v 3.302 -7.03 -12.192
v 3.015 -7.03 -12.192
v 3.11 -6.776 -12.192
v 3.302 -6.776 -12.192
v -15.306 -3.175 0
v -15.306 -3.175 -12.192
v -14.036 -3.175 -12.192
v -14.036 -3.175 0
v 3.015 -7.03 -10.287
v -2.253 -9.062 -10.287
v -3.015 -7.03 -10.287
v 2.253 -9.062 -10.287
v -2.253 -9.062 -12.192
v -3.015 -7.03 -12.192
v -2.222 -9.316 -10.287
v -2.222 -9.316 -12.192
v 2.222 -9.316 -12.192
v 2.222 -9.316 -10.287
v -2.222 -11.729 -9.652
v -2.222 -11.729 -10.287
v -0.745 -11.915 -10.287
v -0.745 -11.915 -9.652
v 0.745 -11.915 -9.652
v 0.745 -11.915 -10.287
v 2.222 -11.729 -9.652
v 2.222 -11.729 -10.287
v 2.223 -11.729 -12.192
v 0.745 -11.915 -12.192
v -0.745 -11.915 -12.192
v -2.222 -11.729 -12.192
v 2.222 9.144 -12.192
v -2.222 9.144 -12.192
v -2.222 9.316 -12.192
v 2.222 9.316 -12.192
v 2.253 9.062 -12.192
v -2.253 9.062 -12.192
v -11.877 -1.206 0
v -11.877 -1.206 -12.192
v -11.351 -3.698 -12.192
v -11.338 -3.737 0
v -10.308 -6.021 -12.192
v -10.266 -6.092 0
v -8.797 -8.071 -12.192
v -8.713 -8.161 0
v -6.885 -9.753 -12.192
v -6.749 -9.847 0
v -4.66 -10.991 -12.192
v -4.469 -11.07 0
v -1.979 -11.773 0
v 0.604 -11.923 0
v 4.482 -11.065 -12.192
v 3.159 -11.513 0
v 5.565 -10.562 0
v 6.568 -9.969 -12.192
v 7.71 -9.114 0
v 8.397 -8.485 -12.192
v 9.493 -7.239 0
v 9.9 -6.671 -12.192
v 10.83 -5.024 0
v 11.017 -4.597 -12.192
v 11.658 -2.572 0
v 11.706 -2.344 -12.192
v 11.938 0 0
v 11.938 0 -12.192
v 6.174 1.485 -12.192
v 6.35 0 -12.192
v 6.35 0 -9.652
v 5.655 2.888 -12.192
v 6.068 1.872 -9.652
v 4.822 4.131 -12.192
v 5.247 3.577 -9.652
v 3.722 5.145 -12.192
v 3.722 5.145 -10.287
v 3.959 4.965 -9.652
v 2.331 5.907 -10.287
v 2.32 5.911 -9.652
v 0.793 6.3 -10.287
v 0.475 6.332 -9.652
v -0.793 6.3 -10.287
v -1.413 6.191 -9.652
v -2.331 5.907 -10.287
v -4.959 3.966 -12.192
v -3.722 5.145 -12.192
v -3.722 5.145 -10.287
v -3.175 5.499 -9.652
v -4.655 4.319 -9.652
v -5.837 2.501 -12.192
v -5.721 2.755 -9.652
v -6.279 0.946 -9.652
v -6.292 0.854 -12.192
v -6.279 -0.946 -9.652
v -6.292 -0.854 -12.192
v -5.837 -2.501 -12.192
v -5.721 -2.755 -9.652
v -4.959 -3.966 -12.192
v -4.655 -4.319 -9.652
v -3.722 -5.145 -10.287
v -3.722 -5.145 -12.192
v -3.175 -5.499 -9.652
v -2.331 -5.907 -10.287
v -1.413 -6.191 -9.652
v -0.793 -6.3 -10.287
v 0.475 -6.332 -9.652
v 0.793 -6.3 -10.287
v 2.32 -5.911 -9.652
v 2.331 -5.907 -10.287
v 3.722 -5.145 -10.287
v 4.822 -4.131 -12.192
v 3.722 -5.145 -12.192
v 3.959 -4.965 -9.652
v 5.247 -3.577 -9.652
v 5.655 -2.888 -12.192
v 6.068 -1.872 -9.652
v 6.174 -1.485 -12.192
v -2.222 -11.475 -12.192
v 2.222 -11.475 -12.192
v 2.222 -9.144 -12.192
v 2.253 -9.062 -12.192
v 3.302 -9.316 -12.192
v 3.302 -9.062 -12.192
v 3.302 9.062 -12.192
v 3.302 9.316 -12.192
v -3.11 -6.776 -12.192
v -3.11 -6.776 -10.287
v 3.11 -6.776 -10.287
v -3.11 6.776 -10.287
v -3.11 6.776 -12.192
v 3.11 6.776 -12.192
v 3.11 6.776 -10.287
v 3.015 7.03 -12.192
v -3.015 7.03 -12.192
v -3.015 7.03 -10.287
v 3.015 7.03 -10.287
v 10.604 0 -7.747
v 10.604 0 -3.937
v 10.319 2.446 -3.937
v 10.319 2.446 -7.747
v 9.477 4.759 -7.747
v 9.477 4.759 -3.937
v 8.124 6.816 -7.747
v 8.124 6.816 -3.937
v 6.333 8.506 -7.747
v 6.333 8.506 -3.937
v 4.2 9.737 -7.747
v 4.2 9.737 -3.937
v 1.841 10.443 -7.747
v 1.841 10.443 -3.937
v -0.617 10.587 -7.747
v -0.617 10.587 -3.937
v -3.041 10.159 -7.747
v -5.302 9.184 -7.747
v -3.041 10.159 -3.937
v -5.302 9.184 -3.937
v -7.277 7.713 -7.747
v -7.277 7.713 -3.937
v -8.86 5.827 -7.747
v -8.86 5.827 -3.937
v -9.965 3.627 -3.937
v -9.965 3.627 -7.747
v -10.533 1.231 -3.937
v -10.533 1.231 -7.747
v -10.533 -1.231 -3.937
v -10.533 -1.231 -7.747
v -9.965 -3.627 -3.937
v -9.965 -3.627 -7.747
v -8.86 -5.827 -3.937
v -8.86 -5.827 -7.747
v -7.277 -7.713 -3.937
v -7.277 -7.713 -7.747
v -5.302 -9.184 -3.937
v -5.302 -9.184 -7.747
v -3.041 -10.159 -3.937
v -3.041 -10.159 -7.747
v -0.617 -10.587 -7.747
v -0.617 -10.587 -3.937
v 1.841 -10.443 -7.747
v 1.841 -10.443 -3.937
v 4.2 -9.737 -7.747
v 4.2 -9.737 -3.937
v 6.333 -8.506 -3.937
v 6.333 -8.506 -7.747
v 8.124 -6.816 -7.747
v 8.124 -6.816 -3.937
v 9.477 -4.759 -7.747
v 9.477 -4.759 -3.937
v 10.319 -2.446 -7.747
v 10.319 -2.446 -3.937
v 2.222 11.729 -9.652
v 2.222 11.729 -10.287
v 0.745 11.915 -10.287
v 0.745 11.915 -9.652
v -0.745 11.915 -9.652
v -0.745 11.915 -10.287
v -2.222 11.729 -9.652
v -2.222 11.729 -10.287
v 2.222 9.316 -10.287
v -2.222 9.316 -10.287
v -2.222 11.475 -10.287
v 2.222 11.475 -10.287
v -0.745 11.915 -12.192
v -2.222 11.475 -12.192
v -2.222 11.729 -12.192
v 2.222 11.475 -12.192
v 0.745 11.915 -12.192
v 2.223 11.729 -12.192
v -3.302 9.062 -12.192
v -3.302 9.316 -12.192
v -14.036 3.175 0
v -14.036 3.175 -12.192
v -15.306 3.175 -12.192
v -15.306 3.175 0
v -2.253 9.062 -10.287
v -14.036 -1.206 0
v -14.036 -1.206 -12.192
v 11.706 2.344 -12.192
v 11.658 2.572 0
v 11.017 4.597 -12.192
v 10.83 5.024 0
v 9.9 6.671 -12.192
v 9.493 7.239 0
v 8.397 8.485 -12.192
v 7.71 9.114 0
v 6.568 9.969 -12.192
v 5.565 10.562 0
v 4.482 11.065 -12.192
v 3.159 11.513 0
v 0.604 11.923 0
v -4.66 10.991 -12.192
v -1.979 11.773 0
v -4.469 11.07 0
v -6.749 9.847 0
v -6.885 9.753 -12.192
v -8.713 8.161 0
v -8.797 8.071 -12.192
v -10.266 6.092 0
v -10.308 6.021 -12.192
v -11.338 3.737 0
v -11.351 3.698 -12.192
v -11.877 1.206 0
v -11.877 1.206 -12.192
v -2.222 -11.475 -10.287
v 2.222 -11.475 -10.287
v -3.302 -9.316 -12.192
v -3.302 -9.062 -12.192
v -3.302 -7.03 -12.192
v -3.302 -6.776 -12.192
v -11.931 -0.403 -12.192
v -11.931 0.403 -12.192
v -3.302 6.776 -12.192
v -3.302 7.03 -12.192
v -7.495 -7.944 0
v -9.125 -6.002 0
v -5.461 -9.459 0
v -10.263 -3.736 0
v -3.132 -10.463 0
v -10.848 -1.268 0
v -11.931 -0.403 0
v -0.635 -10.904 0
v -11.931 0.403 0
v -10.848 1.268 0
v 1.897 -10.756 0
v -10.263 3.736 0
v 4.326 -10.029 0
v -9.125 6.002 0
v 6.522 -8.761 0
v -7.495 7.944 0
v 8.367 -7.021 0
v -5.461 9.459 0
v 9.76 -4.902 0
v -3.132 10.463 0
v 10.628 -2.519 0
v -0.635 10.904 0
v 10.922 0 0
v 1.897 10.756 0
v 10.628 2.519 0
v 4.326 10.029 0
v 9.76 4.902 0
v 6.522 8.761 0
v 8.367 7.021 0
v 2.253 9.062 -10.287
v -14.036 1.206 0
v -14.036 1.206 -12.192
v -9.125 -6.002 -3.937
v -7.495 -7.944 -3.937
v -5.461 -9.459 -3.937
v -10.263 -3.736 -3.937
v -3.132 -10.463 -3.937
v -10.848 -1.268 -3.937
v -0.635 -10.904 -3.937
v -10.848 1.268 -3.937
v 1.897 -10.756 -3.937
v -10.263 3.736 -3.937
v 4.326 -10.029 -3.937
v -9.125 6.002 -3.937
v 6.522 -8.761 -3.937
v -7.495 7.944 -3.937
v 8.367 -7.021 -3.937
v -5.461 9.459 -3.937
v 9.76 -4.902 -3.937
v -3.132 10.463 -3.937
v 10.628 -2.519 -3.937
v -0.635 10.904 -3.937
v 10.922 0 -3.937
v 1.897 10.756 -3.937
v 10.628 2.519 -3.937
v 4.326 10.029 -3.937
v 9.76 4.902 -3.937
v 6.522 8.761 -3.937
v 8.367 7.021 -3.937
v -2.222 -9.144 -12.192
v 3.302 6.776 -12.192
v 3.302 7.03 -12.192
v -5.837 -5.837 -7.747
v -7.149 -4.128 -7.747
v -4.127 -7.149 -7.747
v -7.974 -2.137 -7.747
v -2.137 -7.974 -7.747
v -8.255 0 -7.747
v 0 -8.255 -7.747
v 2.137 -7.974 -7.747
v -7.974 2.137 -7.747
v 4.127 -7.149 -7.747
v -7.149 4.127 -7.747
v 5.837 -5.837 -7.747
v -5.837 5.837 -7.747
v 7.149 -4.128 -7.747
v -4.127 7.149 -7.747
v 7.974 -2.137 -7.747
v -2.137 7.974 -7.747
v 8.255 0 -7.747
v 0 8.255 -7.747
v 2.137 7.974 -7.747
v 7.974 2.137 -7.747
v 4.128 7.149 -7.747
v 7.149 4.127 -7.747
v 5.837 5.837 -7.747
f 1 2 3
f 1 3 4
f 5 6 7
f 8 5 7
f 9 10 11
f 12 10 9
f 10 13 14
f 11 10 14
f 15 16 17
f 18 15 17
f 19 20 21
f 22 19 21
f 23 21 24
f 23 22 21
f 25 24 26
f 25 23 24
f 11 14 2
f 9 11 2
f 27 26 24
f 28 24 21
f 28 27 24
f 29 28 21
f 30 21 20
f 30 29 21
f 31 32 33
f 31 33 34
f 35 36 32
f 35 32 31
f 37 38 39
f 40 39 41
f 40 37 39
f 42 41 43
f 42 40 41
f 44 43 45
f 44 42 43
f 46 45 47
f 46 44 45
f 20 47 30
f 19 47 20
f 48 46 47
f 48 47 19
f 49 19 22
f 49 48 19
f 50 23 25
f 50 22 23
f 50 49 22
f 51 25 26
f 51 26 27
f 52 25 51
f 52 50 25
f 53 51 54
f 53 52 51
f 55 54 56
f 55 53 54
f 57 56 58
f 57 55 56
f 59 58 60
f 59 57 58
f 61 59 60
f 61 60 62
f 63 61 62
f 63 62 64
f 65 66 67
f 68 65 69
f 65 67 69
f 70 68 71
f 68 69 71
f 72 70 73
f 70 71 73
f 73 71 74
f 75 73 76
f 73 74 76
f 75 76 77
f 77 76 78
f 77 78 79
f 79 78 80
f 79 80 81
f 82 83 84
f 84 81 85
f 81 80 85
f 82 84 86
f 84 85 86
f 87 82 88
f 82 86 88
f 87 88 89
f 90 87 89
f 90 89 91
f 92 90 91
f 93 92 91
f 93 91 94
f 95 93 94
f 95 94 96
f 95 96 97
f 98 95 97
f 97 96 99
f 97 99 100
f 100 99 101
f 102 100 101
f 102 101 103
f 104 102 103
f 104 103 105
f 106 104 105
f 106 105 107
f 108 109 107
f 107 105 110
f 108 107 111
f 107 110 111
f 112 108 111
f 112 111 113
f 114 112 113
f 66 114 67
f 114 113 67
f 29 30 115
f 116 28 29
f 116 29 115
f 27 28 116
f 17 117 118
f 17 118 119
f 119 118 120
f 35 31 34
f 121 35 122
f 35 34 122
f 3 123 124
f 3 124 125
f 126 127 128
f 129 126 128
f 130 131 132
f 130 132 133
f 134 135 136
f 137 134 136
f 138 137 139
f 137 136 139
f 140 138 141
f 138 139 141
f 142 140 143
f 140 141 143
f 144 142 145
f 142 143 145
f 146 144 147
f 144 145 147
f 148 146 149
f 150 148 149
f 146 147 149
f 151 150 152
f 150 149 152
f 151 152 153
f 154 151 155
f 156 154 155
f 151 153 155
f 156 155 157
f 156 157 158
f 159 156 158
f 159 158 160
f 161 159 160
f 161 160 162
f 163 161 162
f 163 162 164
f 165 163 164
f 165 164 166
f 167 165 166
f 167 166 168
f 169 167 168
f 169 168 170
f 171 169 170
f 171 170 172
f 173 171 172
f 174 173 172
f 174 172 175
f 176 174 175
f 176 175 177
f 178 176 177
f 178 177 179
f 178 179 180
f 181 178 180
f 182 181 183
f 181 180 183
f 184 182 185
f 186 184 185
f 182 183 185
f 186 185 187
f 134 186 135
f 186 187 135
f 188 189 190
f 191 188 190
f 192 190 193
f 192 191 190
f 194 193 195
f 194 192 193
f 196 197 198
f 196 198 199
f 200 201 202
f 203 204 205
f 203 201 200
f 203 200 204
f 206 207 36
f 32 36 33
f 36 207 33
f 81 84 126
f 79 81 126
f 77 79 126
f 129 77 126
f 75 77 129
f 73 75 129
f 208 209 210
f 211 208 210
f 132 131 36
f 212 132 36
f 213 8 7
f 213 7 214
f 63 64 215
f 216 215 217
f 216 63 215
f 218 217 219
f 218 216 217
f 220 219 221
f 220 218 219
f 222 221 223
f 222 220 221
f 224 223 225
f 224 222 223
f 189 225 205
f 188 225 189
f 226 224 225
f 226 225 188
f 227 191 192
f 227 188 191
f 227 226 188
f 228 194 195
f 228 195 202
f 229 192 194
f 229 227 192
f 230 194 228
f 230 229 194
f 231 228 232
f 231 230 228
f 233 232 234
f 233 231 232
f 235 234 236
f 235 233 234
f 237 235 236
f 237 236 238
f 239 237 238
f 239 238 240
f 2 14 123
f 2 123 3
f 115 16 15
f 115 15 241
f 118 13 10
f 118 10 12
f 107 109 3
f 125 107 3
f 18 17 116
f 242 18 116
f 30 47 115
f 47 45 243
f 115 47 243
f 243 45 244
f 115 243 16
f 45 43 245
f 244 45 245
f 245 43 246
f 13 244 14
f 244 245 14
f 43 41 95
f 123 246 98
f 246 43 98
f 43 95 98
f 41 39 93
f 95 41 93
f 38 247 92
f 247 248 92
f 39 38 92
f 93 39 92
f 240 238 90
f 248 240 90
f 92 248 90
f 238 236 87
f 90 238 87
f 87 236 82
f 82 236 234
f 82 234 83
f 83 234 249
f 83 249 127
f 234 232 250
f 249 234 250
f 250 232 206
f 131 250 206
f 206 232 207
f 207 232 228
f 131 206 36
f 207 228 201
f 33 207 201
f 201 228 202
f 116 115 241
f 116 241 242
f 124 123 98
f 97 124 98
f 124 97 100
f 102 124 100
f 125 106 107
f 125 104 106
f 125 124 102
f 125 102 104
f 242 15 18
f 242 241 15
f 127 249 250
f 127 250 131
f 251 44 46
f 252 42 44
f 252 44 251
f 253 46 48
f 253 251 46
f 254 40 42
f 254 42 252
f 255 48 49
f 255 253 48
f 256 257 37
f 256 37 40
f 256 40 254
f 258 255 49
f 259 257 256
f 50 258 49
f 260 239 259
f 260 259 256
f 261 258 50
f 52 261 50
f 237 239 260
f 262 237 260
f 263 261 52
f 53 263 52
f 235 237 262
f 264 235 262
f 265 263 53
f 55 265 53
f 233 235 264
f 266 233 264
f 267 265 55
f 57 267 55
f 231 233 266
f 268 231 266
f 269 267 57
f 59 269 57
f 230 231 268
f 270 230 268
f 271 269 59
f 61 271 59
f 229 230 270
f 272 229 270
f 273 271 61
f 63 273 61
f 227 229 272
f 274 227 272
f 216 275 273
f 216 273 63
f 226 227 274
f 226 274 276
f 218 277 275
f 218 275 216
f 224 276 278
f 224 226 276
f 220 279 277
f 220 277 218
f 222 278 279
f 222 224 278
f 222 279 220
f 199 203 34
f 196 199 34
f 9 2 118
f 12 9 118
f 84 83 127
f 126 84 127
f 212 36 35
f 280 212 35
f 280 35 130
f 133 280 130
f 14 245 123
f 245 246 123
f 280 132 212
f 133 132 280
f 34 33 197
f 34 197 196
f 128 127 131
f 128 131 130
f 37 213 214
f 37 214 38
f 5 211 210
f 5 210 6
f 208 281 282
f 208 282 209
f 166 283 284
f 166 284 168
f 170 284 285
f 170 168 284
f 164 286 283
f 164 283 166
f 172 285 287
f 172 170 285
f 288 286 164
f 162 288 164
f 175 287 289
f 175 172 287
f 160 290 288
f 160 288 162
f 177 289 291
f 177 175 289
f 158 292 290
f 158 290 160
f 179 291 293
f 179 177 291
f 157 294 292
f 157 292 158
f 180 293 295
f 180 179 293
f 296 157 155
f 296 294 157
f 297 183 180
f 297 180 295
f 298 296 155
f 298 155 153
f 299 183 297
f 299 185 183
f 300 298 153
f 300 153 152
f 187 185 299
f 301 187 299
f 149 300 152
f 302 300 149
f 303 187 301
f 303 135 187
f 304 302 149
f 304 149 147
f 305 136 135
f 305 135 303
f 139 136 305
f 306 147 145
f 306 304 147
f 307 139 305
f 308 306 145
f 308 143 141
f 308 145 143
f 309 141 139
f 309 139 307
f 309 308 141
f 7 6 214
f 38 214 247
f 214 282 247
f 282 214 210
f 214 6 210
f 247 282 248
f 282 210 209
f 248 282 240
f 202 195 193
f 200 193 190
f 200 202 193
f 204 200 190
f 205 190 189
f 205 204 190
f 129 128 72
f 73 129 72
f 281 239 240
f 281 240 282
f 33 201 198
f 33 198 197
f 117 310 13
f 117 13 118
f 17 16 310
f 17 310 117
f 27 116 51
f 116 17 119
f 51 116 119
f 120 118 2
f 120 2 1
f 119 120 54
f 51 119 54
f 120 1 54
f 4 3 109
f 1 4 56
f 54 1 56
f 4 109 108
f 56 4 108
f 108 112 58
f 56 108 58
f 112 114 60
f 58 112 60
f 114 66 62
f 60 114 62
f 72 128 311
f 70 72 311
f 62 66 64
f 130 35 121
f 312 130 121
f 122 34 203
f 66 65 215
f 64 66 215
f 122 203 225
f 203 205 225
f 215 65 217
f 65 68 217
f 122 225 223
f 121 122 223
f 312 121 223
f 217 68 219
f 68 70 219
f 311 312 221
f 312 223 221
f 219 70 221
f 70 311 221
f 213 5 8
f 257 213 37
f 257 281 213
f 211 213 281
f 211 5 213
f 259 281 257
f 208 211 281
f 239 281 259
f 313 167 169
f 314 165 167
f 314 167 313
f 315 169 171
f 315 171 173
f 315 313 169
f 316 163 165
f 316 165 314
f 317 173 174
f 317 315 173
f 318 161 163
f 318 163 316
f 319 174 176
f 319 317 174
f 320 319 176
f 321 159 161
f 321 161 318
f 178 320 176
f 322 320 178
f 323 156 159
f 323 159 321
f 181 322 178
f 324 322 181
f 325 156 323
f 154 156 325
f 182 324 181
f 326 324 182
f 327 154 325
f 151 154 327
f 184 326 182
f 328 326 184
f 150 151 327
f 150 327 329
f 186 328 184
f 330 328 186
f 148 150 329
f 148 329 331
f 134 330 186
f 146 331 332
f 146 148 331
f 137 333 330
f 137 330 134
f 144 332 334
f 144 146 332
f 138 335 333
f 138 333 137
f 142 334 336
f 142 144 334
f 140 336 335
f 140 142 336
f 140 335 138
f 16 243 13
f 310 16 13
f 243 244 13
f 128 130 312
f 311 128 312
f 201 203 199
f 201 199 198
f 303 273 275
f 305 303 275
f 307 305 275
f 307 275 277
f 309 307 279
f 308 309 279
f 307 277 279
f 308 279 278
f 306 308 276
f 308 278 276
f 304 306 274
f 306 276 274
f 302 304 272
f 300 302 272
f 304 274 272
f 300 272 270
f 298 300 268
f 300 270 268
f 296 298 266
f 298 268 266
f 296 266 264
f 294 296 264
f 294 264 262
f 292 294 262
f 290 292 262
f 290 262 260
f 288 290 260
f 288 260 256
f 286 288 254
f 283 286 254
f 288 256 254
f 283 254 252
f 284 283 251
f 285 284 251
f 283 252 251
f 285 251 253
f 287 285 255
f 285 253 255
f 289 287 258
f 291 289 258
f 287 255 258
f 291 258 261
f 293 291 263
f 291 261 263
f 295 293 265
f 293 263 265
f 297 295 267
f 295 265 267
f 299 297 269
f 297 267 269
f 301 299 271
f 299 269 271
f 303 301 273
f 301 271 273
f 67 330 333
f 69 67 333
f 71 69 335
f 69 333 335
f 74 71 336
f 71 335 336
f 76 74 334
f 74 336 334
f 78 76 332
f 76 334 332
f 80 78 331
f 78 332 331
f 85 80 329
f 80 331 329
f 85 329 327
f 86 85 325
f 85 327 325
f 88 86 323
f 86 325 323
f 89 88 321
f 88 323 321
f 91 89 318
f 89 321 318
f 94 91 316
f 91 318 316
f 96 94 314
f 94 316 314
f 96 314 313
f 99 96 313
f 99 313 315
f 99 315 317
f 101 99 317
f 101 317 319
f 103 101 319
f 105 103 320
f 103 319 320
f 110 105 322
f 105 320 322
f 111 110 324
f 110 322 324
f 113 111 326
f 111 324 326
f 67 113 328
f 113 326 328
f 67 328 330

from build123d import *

# Parameters (mm, degrees)
F0_R      = 11.938
F1_DEPTH  = 12.192
F2_R      = 6.35
F3_DEPTH  = 12.193
F4_R      = 10.6045
F5_DEPTH  = 7.747
F6_SIZE   = 1.905
F7_R      = 10.922
F8_DEPTH  = 3.937
F9_W      = 4.445
F9_H      = 23.876
F10_DEPTH = 1.905
F13_DEPTH = 1.905
F14_W     = 6.604
F14_H     = 0.254
F15_DEPTH = 2.54
F17_DEPTH = 12.192


with BuildPart() as f1:
    # F0 (on Top) → F1 (new body)
    with BuildSketch(Plane.XY):
        Circle(F0_R)
    extrude(amount=-F1_DEPTH)

    # F2 (on face) → F3 (cut, through all)
    with BuildSketch(Plane.XY):
        Circle(F2_R)
    extrude(amount=-F3_DEPTH, mode=Mode.SUBTRACT)

    # F4 (on face) → F5 (cut)
    with BuildSketch(Plane.XY):
        Circle(F4_R)
    extrude(amount=-F5_DEPTH, mode=Mode.SUBTRACT)

    # F6
    f6_edges = [f1.edges().sort_by_distance(p)[0] for p in [
        (-6.35, 0, -7.747),
    ]]
    chamfer(f6_edges, length=F6_SIZE)

    # F7 (on Top) → F8 (cut)
    with BuildSketch(Plane.XY):
        Circle(F7_R)
    extrude(amount=-F8_DEPTH, mode=Mode.SUBTRACT)

    # F9 (on face) → F10 (cut)
    with BuildSketch(Plane(origin=(0, 0, -12.192), x_dir=(1, 0, 0), z_dir=(0, 0, -1))):
        Rectangle(F9_W, F9_H)
    extrude(amount=-F10_DEPTH, mode=Mode.SUBTRACT)

    # F12 (on offset) → F13 (cut)
    with BuildSketch(Plane(origin=(0, 0, -12.192), x_dir=(1, 0, 0), z_dir=(0, 0, -1))):
        Polygon((0, 9.144), (-2.2225, 9.144), (-5.08, 1.524), (0, 1.524), align=None)
        Polygon((2.2225, 9.144), (0, 9.144), (0, 1.524), (5.08, 1.524), align=None)
        Polygon((0, -9.144), (2.2225, -9.144), (5.08, -1.524), (0, -1.524), (-5.08, -1.524), (-2.2225, -9.144), align=None)
    extrude(amount=-F13_DEPTH, mode=Mode.SUBTRACT)

    # F14 (on offset) → F15 (join)
    with BuildSketch(Plane(origin=(0, 0, -12.192), x_dir=(1, 0, 0), z_dir=(0, 0, -1))):
        with BuildLine():
            ThreePointArc((2.2225, 11.7292940005), (0, 11.938), (-2.2225, 11.7292940005))
            Line((-2.2225, 11.7292940005), (-2.2225, 11.4752940005))
            Line((-2.2225, 11.4752940005), (2.2225, 11.4752940005))
            Line((2.2225, 11.4752940005), (2.2225, 11.7292940005))
        make_face()
        with Locations((0, 9.1892940005)):
            Rectangle(F14_W, F14_H)
        with Locations((0, 6.9032940005)):
            Rectangle(F14_W, F14_H)
        with Locations((0, -6.9032940005)):
            Rectangle(F14_W, F14_H)
        with Locations((0, -9.1892940005)):
            Rectangle(F14_W, F14_H)
        with BuildLine():
            ThreePointArc((-2.2225, -11.7292940005), (0, -11.938), (2.2225, -11.7292940005))
            Line((2.2225, -11.7292940005), (2.2225, -11.4752940005))
            Line((2.2225, -11.4752940005), (-2.2225, -11.4752940005))
            Line((-2.2225, -11.4752940005), (-2.2225, -11.7292940005))
        make_face()
    extrude(amount=-F15_DEPTH)

    # F16 (on Top) → F17 (join)
    with BuildSketch(Plane.XY):
        with BuildLine():
            ThreePointArc((-11.8768767675, -1.2065), (-11.938, 0), (-11.8768767675, 1.2065))
            Line((-11.8768767675, 1.2065), (-14.0358767675, 1.2065))
            Line((-14.0358767675, 1.2065), (-14.0358767675, 3.175))
            Line((-14.0358767675, 3.175), (-15.3058767675, 3.175))
            Line((-15.3058767675, 3.175), (-15.3058767675, 0))
            Line((-15.3058767675, 0), (-15.3058767675, -3.175))
            Line((-15.3058767675, -3.175), (-14.0358767675, -3.175))
            Line((-14.0358767675, -3.175), (-14.0358767675, -1.2065))
            Line((-14.0358767675, -1.2065), (-11.8768767675, -1.2065))
        make_face()
    extrude(amount=-F17_DEPTH)


solid = f1.part
